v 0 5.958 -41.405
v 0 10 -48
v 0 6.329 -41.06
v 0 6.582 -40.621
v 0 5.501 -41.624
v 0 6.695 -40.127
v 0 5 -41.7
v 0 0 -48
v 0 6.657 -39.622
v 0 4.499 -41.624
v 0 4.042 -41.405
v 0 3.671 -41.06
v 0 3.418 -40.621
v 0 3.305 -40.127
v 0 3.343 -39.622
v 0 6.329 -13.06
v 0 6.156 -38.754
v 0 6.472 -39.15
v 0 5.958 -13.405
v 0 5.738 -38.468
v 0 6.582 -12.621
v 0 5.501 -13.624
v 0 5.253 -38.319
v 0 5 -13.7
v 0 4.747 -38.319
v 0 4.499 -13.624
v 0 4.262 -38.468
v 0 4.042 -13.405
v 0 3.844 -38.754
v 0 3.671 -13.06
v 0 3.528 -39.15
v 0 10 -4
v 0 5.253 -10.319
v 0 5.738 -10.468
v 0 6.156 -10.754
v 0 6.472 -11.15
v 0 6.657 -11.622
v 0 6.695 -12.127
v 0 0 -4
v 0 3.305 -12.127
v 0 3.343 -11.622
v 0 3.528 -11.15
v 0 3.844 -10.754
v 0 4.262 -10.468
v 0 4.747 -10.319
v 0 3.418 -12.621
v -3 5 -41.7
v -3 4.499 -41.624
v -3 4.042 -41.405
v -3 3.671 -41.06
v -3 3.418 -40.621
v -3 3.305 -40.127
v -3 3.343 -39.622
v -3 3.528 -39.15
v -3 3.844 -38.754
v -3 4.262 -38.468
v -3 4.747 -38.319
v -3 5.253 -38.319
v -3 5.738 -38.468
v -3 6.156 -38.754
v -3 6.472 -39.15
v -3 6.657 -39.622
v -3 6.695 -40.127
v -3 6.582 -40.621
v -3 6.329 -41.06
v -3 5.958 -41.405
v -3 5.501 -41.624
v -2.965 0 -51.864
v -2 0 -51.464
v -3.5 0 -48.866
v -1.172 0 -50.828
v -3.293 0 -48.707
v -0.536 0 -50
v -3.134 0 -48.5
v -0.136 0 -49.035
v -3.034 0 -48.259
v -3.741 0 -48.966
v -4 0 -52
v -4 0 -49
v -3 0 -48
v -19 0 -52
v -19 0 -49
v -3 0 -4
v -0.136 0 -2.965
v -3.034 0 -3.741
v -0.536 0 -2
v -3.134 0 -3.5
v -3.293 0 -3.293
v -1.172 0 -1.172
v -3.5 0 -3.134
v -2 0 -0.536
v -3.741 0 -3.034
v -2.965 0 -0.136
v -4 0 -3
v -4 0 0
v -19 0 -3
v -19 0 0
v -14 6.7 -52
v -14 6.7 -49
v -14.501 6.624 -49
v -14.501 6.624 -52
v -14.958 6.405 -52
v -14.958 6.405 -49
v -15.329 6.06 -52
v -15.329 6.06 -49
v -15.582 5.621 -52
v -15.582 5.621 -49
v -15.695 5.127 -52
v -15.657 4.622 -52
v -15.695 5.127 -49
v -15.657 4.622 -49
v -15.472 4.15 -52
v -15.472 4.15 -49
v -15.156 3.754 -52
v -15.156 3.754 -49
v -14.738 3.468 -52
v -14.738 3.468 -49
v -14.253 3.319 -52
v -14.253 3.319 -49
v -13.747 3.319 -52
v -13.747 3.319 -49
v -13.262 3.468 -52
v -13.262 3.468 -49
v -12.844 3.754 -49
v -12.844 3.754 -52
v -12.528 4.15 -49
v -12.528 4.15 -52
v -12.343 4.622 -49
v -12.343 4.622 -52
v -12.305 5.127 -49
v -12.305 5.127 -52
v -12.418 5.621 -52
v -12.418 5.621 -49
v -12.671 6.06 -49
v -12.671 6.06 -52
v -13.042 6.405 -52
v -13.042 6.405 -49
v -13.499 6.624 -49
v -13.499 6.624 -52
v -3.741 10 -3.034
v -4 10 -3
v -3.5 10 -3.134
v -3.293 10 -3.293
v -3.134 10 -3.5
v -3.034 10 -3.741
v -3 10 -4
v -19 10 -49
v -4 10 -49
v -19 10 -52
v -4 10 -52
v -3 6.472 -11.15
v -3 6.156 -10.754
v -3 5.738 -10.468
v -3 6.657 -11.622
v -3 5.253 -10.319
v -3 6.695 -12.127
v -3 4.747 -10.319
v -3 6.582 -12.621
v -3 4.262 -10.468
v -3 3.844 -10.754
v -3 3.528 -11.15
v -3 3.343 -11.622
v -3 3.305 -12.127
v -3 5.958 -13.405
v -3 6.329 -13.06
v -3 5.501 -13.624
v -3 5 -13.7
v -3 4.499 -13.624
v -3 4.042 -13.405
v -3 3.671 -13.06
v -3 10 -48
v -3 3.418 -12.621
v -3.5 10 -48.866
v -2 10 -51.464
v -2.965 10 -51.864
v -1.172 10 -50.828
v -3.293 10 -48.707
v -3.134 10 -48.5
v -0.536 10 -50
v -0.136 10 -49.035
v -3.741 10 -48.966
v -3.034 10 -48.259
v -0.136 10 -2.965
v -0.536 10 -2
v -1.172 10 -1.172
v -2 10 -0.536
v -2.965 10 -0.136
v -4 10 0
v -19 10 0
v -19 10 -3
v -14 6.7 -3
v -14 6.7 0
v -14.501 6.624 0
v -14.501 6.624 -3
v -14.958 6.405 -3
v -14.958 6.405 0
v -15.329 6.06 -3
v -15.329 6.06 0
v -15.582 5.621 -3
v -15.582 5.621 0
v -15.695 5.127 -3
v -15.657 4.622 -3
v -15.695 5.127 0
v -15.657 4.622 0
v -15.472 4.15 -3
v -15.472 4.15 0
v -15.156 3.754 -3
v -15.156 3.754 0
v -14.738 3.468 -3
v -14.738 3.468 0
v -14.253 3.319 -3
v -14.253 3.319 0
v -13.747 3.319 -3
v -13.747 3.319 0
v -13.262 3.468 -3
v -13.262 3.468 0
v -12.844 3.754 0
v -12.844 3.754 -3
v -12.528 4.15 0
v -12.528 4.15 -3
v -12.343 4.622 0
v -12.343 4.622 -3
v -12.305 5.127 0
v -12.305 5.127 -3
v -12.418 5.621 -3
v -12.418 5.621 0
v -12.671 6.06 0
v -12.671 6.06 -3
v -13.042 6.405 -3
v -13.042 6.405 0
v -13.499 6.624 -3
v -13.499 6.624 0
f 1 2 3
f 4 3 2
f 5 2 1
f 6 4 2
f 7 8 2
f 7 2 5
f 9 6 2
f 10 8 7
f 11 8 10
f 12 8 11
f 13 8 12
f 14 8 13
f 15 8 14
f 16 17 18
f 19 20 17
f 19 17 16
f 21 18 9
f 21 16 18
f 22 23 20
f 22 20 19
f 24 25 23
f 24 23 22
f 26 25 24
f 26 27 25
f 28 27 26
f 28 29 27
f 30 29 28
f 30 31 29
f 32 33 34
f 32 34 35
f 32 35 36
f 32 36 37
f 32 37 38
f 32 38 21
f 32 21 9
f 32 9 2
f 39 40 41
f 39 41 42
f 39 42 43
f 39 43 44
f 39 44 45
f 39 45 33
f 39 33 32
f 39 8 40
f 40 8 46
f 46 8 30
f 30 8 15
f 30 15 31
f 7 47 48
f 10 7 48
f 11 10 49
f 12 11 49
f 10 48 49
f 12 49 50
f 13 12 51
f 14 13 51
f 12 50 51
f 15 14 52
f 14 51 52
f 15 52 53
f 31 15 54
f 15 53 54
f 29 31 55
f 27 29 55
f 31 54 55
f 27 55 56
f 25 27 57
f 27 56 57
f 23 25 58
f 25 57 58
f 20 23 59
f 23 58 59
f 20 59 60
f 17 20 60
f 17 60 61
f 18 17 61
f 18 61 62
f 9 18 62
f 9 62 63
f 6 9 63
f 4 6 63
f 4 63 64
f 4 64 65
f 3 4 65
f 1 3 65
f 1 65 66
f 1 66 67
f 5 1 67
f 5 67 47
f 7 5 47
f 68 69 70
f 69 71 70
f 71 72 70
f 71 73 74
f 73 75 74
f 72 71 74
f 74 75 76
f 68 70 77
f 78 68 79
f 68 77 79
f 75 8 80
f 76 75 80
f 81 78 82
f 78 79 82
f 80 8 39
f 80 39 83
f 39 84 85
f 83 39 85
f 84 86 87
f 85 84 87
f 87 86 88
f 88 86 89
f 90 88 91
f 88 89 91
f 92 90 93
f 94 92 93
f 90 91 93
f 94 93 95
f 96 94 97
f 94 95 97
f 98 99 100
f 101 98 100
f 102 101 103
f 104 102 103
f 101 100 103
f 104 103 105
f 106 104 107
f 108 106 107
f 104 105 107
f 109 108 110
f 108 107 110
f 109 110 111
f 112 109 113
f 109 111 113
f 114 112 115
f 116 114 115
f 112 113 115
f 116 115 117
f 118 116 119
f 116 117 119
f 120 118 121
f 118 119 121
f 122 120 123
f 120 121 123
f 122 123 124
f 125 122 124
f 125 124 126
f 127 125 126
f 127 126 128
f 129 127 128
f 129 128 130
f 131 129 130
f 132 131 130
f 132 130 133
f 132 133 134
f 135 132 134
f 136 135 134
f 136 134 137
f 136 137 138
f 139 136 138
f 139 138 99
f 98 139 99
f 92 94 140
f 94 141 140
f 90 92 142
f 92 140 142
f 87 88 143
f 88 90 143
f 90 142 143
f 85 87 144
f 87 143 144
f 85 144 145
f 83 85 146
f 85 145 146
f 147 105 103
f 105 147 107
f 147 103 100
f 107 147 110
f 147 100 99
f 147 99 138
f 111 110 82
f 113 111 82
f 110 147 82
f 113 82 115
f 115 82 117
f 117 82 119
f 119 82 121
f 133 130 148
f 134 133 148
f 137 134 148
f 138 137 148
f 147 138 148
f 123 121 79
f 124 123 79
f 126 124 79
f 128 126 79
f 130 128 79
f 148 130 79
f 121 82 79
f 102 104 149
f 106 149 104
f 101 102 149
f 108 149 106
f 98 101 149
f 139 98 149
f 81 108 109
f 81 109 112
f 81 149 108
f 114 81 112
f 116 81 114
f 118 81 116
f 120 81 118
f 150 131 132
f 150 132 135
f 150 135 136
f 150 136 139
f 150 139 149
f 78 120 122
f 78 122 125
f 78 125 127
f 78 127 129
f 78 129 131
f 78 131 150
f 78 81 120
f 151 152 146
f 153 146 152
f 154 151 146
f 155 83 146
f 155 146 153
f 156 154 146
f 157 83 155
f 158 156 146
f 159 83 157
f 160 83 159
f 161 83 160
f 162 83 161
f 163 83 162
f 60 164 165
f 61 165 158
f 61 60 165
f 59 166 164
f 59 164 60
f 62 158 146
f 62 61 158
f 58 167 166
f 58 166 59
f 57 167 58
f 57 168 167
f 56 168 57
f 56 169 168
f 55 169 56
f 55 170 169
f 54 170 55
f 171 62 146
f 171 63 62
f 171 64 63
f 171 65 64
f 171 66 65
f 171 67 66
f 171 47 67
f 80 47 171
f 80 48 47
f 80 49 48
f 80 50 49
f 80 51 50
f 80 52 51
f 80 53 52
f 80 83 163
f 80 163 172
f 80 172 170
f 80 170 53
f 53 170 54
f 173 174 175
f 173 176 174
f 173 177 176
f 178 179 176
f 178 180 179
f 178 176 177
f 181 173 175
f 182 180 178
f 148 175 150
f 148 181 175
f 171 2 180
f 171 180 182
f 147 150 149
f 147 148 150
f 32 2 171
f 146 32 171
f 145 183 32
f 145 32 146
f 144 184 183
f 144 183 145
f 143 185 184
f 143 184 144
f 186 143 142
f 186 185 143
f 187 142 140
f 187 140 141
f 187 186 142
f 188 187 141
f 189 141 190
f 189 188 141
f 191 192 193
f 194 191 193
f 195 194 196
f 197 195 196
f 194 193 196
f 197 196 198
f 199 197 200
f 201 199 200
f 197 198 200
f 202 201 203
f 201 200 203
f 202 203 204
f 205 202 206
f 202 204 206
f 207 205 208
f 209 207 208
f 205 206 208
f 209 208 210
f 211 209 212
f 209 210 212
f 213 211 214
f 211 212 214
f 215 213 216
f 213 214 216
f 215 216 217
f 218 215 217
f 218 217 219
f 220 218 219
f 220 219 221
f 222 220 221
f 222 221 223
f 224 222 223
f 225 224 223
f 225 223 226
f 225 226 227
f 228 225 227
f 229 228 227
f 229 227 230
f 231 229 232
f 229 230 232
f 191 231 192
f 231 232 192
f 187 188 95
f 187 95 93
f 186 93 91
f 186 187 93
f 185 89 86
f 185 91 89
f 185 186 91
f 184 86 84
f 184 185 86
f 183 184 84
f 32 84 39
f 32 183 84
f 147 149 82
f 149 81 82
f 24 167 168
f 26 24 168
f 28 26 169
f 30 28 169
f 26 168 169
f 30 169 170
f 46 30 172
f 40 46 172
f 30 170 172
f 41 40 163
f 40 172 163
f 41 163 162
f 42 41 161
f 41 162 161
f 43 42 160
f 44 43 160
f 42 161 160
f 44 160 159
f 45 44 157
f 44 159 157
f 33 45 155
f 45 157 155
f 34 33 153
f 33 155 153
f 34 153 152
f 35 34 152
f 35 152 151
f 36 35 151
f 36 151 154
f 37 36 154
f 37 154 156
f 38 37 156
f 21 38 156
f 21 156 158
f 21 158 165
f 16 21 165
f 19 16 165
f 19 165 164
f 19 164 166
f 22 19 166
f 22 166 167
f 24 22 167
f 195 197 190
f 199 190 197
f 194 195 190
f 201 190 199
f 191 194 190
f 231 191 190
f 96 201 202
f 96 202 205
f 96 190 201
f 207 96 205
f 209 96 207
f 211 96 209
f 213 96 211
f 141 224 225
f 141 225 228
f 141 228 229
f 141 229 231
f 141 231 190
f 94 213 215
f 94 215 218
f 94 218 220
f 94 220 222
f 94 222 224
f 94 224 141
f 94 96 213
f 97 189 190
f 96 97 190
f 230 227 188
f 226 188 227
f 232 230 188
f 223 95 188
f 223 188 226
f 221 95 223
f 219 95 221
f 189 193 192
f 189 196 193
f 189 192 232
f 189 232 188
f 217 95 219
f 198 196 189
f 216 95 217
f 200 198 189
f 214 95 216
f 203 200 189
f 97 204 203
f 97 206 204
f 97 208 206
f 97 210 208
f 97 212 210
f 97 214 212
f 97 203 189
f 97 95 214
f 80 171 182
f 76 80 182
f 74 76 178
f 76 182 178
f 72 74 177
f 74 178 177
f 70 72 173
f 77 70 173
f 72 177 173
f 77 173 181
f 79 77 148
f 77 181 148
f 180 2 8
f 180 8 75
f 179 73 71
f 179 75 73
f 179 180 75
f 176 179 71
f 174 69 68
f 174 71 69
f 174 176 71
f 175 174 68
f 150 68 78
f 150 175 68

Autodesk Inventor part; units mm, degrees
ref_plane "YZ Plane" through (0, 0, 0) normal (1, 0, 0) x (0, 1, 0)
ref_plane "XZ Plane" through (0, 0, 0) normal (0, 1, 0) x (-1, 0, 0)
ref_plane "XY Plane" through (0, 0, 0) normal (0, 0, 1) x (1, 0, 0)
sketch "Sketch1" plane through (0, 0, 0) normal (0, 1, 0) x (-1, 0, 0)
  line L0 (0, 0) -> (3, 0)
  line L1 (3, 0) -> (3, -52)
  line L2 (3, -52) -> (0, -52)
  line L3 (0, -52) -> (0, 0)
  line L4 (3, -52) -> (19, -52)
  line L5 (19, -52) -> (19, -49)
  line L6 (19, -49) -> (3, -49)
  line L7 (3, -49) -> (3, -52)
  line L8 (3, 0) -> (19, 0)
  line L9 (19, 0) -> (19, -3)
  line L10 (19, -3) -> (3, -3)
  line L11 (3, -3) -> (3, 0)
  dimension "d0" = 3
  dimension "d1" = 3
  dimension "d2" = 3
  dimension "d3" = 46
  dimension "d4" = 16
extrude "Extrusion1" add sketch "Sketch1" along normal blind 10
fillet "Fillet1" radius 1 2 edges at (-3, 5, -49) (-3, 5, -3)
fillet "Fillet2" radius 4 2 edges at (0, 5, -52) (0, 5, 0)
sketch "Sketch2" plane through (-19, 0, -52) normal (0, 0, -1) x (-1, 0, 0)
  line L0 (-15, 10) -> (0, 10) projected
  line L1 (0, 0) -> (0, 10) projected
  point P0 (-19, 0)
  point P1 (-5, 5)
  dimension "d9" = 5
  dimension "d10" = 5
hole "Hole1" at (-14, 5, -52) direction (0, 0, 1) diameter 3.4 end through all clearance for "Flat Head Machine Screw" size "M3" standard "Ansi Metric M Profile"
sketch "Sketch3" plane through (0, 0, -4) normal (1, 0, 0) x (0, 0, -1)
  line L0 (44, 10) -> (44, 0) projected
  point P0 (-4, 0)
  point P1 (8, 5)
  point P2 (36, 5)
  point P3 (44, 5)
  point P4 (45, 10)
  point P5 (-1, 10)
  dimension "d18" = 9
  dimension "d19" = 9
hole "Hole2" at (0, 5, -12) at (0, 5, -40) direction (-1, 0, 0) diameter 3.4 end through all clearance for "Flat Head Machine Screw" size "M3" standard "Ansi Metric M Profile"
equation "\"d1\" = d0"
equation "\"d2\" = d0"
equation "\"d19\" = d18"
properties part number "Top_End Stopper" material "Aluminum 6061"
